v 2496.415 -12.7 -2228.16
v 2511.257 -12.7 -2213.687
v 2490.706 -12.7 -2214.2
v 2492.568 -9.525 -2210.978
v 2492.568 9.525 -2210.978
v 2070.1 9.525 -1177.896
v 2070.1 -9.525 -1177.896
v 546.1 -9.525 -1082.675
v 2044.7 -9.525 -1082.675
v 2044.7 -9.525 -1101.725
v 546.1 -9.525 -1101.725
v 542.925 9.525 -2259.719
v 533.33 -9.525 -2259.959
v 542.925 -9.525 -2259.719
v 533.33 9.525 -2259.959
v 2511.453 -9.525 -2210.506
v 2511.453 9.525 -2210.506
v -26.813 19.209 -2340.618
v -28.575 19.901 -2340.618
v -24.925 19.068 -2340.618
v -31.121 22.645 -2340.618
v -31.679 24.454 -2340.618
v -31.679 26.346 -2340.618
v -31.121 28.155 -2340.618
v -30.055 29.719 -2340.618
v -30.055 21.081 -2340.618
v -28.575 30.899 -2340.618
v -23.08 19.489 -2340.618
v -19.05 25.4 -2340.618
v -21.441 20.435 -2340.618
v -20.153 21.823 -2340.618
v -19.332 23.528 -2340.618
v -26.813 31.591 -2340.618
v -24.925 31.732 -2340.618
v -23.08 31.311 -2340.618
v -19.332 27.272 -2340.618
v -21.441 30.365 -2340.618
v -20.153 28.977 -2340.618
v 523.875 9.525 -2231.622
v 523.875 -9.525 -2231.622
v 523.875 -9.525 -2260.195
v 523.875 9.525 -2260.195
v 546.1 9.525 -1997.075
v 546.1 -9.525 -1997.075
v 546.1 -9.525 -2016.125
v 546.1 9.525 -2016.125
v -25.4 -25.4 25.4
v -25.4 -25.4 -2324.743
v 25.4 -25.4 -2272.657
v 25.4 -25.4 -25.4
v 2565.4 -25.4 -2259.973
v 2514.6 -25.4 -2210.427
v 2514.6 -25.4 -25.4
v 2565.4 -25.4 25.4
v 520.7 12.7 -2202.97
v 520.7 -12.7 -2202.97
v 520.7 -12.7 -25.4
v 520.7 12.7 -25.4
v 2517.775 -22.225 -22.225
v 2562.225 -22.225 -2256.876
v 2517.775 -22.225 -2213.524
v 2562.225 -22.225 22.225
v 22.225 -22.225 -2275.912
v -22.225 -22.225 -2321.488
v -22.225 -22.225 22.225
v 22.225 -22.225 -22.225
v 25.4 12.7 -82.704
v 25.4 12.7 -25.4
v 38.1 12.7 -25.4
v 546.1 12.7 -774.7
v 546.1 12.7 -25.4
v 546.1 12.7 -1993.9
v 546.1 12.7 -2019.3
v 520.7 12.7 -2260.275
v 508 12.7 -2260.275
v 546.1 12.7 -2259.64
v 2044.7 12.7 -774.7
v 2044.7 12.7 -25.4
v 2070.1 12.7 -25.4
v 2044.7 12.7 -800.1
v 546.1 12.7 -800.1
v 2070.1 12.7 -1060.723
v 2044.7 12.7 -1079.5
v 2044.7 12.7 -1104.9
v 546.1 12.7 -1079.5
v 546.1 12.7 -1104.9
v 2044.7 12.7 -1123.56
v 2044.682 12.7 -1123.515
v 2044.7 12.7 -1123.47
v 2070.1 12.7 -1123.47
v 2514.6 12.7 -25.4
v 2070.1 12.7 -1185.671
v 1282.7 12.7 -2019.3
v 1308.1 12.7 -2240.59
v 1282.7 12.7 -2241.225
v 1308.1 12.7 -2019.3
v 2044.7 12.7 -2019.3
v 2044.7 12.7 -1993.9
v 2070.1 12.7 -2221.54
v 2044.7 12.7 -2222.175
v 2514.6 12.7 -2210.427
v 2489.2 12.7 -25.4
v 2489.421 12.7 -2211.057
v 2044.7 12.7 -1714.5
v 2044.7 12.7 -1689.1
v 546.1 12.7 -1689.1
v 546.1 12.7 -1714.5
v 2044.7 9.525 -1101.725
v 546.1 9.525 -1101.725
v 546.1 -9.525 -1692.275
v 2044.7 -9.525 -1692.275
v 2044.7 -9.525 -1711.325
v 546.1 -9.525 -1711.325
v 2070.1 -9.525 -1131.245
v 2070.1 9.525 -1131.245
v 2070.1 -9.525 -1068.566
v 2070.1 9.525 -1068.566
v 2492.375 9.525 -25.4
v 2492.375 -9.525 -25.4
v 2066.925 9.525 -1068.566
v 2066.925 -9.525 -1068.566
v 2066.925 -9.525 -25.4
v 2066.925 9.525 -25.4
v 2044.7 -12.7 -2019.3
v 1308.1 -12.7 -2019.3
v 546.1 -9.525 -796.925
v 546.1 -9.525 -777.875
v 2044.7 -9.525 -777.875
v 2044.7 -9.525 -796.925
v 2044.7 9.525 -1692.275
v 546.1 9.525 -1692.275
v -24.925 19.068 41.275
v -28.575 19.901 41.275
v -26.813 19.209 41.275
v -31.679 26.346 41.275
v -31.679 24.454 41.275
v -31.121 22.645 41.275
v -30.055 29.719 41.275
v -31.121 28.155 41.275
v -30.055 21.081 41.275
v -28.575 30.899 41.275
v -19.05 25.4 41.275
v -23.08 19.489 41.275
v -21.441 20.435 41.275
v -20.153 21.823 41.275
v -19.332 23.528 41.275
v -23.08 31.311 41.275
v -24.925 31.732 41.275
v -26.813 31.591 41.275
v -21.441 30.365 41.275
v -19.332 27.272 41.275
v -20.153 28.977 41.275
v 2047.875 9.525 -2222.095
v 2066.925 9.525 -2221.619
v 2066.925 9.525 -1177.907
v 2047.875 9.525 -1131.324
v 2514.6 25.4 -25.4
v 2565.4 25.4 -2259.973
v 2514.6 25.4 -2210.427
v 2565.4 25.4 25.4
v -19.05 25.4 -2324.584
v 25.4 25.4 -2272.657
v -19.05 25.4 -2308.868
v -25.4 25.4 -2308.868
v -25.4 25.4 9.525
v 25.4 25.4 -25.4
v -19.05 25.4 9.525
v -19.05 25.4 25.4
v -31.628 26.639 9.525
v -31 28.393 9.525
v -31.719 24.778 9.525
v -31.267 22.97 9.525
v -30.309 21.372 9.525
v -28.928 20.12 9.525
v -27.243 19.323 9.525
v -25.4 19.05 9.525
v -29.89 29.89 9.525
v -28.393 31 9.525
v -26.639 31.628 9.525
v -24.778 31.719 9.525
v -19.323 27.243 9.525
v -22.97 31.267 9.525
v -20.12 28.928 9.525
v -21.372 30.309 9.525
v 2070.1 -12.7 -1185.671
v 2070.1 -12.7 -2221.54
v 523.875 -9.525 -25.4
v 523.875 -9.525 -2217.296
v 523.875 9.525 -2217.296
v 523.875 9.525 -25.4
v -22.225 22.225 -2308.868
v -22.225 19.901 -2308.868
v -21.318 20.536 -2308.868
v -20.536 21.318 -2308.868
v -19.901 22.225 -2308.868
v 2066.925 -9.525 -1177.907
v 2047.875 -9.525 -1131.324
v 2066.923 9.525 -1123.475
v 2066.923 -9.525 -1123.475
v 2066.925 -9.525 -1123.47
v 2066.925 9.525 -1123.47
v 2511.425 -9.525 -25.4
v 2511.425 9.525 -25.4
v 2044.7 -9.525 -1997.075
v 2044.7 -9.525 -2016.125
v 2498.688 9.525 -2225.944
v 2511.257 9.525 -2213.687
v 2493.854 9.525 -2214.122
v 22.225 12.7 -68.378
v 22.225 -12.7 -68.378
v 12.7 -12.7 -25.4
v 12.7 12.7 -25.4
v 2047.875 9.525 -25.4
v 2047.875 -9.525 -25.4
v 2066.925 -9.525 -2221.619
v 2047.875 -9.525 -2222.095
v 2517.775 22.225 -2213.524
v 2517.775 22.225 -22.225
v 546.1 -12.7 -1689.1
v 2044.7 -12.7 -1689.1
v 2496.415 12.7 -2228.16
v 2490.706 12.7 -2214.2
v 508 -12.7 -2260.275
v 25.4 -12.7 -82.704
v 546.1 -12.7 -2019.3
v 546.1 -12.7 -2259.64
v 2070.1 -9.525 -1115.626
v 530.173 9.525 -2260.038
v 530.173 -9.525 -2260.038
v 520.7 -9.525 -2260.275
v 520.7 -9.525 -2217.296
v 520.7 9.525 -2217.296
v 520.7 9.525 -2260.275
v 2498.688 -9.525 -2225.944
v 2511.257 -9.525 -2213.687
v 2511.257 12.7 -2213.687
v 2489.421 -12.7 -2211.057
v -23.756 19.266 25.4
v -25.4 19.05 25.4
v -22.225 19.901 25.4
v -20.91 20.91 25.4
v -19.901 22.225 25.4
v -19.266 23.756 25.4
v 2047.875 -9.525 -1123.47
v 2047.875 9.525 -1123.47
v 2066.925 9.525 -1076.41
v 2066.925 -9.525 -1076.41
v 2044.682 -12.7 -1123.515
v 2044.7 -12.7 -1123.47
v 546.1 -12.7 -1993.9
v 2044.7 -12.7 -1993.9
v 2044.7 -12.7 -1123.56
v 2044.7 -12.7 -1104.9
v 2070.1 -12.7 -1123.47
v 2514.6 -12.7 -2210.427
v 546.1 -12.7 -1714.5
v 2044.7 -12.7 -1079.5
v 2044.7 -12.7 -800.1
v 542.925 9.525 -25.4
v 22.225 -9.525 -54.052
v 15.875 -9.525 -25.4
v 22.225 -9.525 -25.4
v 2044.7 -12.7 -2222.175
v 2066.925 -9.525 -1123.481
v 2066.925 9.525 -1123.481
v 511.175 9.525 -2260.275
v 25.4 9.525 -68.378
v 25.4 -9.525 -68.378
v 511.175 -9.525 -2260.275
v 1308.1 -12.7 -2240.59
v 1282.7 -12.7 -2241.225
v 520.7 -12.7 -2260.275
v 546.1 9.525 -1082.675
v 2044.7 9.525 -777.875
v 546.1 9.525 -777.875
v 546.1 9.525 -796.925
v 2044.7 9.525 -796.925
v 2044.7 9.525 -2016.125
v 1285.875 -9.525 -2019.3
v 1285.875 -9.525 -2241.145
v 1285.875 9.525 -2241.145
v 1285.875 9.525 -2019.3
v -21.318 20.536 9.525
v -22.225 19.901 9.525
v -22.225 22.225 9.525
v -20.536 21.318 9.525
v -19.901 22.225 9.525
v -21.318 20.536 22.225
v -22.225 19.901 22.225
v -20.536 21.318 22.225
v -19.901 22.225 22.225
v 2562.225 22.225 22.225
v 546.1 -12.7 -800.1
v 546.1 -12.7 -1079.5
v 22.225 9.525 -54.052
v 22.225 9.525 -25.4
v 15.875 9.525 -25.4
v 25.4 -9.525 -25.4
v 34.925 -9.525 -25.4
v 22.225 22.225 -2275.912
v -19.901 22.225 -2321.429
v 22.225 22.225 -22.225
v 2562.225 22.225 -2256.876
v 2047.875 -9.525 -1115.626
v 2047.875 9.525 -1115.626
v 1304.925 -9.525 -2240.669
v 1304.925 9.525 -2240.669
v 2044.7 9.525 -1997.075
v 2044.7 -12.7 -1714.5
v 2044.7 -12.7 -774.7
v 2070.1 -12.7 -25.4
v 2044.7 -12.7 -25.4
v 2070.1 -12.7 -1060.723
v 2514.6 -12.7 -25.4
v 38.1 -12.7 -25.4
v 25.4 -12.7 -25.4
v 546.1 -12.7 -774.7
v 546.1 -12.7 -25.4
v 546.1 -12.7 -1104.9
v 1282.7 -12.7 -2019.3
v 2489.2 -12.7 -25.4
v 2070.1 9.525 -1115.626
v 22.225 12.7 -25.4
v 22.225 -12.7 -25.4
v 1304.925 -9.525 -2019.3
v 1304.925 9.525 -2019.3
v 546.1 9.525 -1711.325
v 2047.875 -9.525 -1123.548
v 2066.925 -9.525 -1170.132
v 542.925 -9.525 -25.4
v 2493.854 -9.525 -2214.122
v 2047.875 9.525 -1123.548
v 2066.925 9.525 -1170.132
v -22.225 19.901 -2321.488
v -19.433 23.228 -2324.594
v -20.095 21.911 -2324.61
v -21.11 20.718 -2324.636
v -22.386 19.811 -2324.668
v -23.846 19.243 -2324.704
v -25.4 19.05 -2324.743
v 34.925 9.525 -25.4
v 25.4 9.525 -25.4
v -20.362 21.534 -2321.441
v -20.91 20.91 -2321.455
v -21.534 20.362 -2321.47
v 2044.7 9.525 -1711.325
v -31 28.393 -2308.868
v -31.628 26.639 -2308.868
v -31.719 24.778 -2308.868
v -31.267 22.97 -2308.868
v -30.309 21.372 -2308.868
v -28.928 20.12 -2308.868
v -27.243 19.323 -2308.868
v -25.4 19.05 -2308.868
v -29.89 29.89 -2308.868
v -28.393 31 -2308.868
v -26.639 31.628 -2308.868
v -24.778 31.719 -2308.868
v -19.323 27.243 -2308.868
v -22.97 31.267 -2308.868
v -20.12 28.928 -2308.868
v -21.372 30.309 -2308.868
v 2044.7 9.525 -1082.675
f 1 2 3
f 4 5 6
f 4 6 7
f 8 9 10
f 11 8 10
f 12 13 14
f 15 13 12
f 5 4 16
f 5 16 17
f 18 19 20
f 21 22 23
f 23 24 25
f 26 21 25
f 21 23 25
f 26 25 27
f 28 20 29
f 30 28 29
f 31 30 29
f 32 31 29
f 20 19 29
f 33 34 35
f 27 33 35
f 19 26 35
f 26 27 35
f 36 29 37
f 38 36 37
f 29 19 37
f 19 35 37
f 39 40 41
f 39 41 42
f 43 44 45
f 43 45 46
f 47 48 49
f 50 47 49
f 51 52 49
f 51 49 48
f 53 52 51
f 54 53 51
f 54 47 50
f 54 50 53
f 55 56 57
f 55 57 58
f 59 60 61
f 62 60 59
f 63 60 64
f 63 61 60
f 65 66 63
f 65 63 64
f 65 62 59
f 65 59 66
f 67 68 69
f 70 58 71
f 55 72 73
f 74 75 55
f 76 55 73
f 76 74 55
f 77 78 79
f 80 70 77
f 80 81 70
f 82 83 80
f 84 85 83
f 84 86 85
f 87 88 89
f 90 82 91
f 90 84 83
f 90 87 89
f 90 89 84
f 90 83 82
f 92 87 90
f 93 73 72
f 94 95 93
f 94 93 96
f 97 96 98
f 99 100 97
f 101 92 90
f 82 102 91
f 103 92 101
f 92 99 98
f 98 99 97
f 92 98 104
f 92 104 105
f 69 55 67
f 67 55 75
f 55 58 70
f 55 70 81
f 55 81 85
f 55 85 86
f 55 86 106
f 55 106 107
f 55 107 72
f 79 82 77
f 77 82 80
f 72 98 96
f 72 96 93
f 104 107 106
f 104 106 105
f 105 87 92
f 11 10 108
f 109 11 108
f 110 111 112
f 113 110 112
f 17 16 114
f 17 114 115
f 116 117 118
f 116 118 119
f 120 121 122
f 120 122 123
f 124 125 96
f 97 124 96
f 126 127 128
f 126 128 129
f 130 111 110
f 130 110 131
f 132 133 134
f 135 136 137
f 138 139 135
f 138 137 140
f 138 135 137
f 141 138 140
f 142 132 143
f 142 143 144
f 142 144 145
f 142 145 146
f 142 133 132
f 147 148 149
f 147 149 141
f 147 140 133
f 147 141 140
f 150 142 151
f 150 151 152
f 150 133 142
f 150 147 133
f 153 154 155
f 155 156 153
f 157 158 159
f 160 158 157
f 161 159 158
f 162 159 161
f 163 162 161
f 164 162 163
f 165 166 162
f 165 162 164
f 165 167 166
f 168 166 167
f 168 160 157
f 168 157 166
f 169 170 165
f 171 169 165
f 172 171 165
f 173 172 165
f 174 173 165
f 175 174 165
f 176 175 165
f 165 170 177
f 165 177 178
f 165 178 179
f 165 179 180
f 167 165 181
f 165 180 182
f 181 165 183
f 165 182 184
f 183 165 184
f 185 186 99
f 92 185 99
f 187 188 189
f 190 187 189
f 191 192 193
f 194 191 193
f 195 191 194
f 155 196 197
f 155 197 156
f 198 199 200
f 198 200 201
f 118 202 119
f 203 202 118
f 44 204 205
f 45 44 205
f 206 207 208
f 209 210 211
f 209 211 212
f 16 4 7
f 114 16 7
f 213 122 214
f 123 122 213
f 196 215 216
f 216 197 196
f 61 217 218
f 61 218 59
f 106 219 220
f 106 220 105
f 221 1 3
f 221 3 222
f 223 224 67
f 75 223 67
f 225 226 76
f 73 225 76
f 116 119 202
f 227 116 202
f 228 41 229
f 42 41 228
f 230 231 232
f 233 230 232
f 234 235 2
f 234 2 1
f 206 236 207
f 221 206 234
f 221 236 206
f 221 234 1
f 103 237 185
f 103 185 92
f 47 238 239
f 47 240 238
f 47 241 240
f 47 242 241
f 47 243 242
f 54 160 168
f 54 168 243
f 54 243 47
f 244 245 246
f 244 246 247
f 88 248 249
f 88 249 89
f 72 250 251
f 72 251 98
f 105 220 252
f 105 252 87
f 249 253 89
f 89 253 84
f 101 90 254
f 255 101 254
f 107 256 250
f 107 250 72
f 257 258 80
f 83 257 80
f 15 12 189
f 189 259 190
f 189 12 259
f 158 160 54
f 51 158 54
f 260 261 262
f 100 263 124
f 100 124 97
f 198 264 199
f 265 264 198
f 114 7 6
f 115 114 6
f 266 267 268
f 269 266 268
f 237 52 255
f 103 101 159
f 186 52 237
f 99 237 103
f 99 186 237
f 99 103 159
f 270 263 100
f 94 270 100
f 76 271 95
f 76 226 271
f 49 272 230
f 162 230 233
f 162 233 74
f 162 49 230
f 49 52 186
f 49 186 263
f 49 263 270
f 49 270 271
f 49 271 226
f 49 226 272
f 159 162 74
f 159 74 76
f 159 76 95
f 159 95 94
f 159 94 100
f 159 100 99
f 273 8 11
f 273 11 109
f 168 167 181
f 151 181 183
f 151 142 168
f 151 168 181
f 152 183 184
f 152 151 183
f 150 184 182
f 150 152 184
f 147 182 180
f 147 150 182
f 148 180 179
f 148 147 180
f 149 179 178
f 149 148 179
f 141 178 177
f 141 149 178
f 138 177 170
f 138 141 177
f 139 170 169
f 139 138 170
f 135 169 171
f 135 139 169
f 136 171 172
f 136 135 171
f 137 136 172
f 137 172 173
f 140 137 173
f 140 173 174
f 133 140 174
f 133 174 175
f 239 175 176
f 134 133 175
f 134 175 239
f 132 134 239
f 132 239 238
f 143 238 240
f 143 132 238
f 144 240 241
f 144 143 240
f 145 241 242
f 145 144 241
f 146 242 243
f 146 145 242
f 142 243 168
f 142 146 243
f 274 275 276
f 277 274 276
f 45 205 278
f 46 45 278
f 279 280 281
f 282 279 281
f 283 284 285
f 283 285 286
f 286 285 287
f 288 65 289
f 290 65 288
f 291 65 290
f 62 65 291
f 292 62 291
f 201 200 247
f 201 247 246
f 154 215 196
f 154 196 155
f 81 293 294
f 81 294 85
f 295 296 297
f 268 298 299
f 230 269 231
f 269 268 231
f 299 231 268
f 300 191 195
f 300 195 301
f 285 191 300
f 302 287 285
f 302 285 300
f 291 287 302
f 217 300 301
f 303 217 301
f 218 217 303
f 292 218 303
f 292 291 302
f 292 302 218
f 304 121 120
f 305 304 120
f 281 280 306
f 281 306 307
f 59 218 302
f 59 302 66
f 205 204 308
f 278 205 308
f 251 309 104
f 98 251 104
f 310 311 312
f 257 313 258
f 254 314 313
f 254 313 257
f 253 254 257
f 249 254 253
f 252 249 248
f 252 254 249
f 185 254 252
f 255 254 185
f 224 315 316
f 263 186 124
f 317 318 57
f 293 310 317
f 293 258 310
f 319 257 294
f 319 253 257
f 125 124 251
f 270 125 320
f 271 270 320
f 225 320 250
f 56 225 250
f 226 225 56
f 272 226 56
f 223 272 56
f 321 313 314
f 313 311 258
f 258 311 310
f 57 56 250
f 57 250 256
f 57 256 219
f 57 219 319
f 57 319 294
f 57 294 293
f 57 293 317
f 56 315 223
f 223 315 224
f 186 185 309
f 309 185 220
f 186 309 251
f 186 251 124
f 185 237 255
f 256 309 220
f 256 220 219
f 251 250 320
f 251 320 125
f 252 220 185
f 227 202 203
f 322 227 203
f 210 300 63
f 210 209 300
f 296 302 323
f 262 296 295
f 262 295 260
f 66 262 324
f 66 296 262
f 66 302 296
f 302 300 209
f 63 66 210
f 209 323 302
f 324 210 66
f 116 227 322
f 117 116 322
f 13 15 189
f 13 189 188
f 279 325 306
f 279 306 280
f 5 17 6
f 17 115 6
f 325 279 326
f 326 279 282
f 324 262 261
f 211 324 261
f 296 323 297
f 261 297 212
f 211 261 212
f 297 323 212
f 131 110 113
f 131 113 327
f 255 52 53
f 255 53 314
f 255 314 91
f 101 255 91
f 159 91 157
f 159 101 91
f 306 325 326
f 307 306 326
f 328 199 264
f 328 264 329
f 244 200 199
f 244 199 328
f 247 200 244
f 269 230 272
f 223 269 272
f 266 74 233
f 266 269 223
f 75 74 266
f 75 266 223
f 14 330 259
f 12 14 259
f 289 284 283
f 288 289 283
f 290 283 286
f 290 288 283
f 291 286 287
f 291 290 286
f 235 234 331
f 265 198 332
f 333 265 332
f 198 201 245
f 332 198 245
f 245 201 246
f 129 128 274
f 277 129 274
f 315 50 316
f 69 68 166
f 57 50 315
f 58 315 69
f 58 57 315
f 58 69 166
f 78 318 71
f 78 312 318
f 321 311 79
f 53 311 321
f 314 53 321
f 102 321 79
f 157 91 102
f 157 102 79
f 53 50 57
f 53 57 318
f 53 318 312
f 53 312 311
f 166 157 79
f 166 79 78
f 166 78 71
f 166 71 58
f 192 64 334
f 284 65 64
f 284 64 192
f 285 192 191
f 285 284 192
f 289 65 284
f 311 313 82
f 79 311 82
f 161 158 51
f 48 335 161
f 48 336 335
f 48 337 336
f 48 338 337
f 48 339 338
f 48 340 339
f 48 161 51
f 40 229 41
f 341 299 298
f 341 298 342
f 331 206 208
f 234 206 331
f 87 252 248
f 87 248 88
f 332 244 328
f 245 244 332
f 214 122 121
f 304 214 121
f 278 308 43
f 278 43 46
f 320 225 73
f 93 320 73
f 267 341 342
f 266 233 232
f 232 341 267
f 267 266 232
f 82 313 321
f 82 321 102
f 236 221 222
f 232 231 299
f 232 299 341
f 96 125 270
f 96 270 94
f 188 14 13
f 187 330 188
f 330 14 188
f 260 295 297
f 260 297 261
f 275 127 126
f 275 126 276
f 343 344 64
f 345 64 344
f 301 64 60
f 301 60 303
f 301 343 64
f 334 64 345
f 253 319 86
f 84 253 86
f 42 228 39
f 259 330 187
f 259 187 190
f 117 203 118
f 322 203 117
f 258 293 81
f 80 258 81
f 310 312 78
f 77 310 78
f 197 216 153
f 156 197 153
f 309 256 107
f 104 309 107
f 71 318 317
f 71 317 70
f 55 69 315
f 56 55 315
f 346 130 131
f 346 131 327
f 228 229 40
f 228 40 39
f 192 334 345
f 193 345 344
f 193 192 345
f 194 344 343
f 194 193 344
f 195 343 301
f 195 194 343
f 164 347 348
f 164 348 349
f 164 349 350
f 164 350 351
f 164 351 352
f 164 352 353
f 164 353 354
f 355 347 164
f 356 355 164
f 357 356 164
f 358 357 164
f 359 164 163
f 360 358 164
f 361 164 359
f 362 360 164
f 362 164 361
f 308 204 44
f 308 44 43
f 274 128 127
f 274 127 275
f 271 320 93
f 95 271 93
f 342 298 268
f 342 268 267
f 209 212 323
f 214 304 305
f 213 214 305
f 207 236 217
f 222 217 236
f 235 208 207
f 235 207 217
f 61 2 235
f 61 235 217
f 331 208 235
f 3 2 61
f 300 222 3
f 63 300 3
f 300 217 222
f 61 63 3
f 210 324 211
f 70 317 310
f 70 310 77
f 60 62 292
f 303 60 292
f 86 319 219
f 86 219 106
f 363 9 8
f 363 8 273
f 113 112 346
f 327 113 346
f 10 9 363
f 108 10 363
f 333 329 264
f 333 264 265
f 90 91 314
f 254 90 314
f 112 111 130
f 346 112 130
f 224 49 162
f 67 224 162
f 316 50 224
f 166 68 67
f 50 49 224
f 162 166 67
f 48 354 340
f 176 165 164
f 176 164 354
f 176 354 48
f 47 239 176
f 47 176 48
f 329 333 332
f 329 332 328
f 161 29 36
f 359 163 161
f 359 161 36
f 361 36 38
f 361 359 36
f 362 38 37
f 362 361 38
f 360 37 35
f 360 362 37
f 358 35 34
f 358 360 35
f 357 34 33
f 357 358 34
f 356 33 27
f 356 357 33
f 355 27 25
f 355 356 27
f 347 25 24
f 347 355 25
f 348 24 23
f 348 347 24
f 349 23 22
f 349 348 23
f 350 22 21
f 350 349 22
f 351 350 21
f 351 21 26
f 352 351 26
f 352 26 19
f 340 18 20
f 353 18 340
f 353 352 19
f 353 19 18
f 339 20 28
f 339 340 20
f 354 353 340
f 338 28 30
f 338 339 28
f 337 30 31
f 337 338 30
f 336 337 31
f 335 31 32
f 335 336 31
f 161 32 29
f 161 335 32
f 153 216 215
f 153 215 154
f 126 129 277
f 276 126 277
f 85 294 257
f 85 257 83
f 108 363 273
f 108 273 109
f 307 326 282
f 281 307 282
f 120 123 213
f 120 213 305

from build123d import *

# Parameters (mm, degrees)
SKETCH2_W           = 50.8
SKETCH2_H           = 50.8
SKETCH2_W_2         = 44.45
SKETCH2_H_2         = 44.45
BOSS_EXTRUDE1_REACH = 2301.343
SKETCH3_W           = 25.4
SKETCH3_H           = 25.4
SKETCH3_W_2         = 19.05
SKETCH3_H_2         = 19.05
SKETCH4_W           = 25.4
SKETCH4_H           = 25.4
SKETCH4_W_2         = 19.05
SKETCH4_H_2         = 19.05
BOSS_EXTRUDE2_DEPTH = 1498.6
SKETCH5_W           = 25.4
SKETCH5_H           = 25.4
SKETCH5_W_2         = 19.05
SKETCH5_H_2         = 19.05
BOSS_EXTRUDE3_REACH = 307.443
SKETCH11_W          = 25.4
SKETCH11_H          = 25.4
SKETCH11_W_2        = 19.05
SKETCH11_H_2        = 19.05
SKETCH13_W          = 25.4
SKETCH13_H          = 25.4
SKETCH13_W_2        = 19.05
SKETCH13_H_2        = 19.05
SKETCH15_R          = 6.35
BOSS_EXTRUDE4_DEPTH = 15.875
SKETCH16_R          = 6.35
BOSS_EXTRUDE5_DEPTH = 15.875


with BuildPart() as part:
    # Sweep1: sweep along a path in Sketch1
    with BuildLine(Plane(origin=(0, 0, 0), x_dir=(1, 0, 0), z_dir=(0, 1, 0))) as sweep1_path:
        Line((0, 2298.7), (0, 0))
        Line((0, 0), (2540, 0))
        Line((2540, 0), (2540, 2235.2))
        Line((2540, 2235.2), (0, 2298.7))
    # Sketch2 → Sweep1 (sweep)
    with BuildSketch(Plane.XY.offset(-1016)):
        Rectangle(SKETCH2_W, SKETCH2_H)
        Rectangle(SKETCH2_W_2, SKETCH2_H_2, mode=Mode.SUBTRACT)
    sweep(path=sweep1_path.line, transition=Transition.RIGHT)

    # Boss-Extrude1: up to this face of the body (flat: up to its plane)
    boss_extrude1_end = Plane(part.part.faces().sort_by_distance((1270, 0, -2241.54206374))[0])
    # Sketch3 → Boss-Extrude1 (add, up to the picked face)
    with BuildSketch(Plane(origin=(0, 0, -25.4), x_dir=(-1, 0, 0), z_dir=(0, 0, -1)), mode=Mode.PRIVATE) as boss_extrude1_sk1:
        with Locations((-533.4, 0)):
            Rectangle(SKETCH3_W, SKETCH3_H)
        with Locations((-533.4, 0)):
            Rectangle(SKETCH3_W_2, SKETCH3_H_2, mode=Mode.SUBTRACT)
    boss_extrude1_tool1 = split(extrude(boss_extrude1_sk1.sketch, amount=BOSS_EXTRUDE1_REACH, mode=Mode.PRIVATE), bisect_by=boss_extrude1_end, keep=Keep.BOTH, mode=Mode.PRIVATE)
    add(boss_extrude1_tool1.solids().sort_by_distance((521.05921, 0, -25.4))[0])
    # Sketch3 → Boss-Extrude1 (add, up to the picked face)
    with BuildSketch(Plane(origin=(0, 0, -25.4), x_dir=(-1, 0, 0), z_dir=(0, 0, -1)), mode=Mode.PRIVATE) as boss_extrude1_sk2:
        with Locations((-2057.4, 0)):
            Rectangle(SKETCH3_W, SKETCH3_H)
        with Locations((-2057.4, 0)):
            Rectangle(SKETCH3_W_2, SKETCH3_H_2, mode=Mode.SUBTRACT)
    boss_extrude1_tool2 = split(extrude(boss_extrude1_sk2.sketch, amount=BOSS_EXTRUDE1_REACH, mode=Mode.PRIVATE), bisect_by=boss_extrude1_end, keep=Keep.BOTH, mode=Mode.PRIVATE)
    add(boss_extrude1_tool2.solids().sort_by_distance((2057.4, -12.34079, -25.4))[0])

    # Sketch4 → Boss-Extrude2 (add)
    with BuildSketch(Plane(origin=(546.1, 0, 0), x_dir=(0, 0, -1), z_dir=(1, 0, 0))):
        with Locations((787.4, 0)):
            Rectangle(SKETCH4_W, SKETCH4_H)
        with Locations((787.4, 0)):
            Rectangle(SKETCH4_W_2, SKETCH4_H_2, mode=Mode.SUBTRACT)
        with Locations((1092.2, 0)):
            Rectangle(SKETCH4_W, SKETCH4_H)
        with Locations((1092.2, 0)):
            Rectangle(SKETCH4_W_2, SKETCH4_H_2, mode=Mode.SUBTRACT)
        with Locations((1701.8, 0)):
            Rectangle(SKETCH4_W, SKETCH4_H)
        with Locations((1701.8, 0)):
            Rectangle(SKETCH4_W_2, SKETCH4_H_2, mode=Mode.SUBTRACT)
        with Locations((2006.6, 0)):
            Rectangle(SKETCH4_W, SKETCH4_H)
        with Locations((2006.6, 0)):
            Rectangle(SKETCH4_W_2, SKETCH4_H_2, mode=Mode.SUBTRACT)
    extrude(amount=BOSS_EXTRUDE2_DEPTH)

    # Sweep2: sweep along a path in Sketch6
    with BuildLine(Plane(origin=(0, 25.4, 0), x_dir=(1, 0, 0), z_dir=(0, 1, 0))) as sweep2_path:
        Line((25.4, 25.4), (520.7, 2260.27456374))
    # Sketch5 → Sweep2 (sweep)
    with BuildSketch(Plane(origin=(0, 0, -25.4), x_dir=(-1, 0, 0), z_dir=(0, 0, -1))):
        with Locations((-25.4, 0)):
            Rectangle(SKETCH5_W, SKETCH5_H)
        with Locations((-25.4, 0)):
            Rectangle(SKETCH5_W_2, SKETCH5_H_2, mode=Mode.SUBTRACT)
    sweep(path=sweep2_path.line)

    # Boss-Extrude3: up to this face of the body (flat: up to its plane)
    boss_extrude3_end = Plane(part.part.faces().sort_by_distance((1269.73814433, 0, -2241.548610131))[0])
    # Sketch11 → Boss-Extrude3 (add, up to the picked face)
    with BuildSketch(Plane(origin=(0, 0, -2019.3), x_dir=(-1, 0, 0), z_dir=(0, 0, -1)), mode=Mode.PRIVATE) as boss_extrude3_sk1:
        with Locations((-1295.4, 0)):
            Rectangle(SKETCH11_W, SKETCH11_H)
        with Locations((-1295.4, 0)):
            Rectangle(SKETCH11_W_2, SKETCH11_H_2, mode=Mode.SUBTRACT)
    boss_extrude3_tool1 = split(extrude(boss_extrude3_sk1.sketch, amount=BOSS_EXTRUDE3_REACH, mode=Mode.PRIVATE), bisect_by=boss_extrude3_end, keep=Keep.BOTH, mode=Mode.PRIVATE)
    add(boss_extrude3_tool1.solids().sort_by_distance((1295.4, -12.34079, -2019.3))[0])

    # Sweep6: sweep along a path in Sketch14
    with BuildLine(Plane(origin=(0, 25.4, 0), x_dir=(1, 0, 0), z_dir=(0, 1, 0))) as sweep6_path:
        Line((2514.6, 25.4), (2070.1, 1123.46978187))
        Line((2070.1, 1123.46978187), (2514.6, 2210.42706374))
    # Sketch13 → Sweep6 (sweep)
    with BuildSketch(Plane(origin=(0, 0, -25.4), x_dir=(-1, 0, 0), z_dir=(0, 0, -1))):
        with Locations((-2501.9, 0)):
            Rectangle(SKETCH13_W, SKETCH13_H)
        with Locations((-2501.9, 0)):
            Rectangle(SKETCH13_W_2, SKETCH13_H_2, mode=Mode.SUBTRACT)
    sweep(path=sweep6_path.line, transition=Transition.RIGHT)

    # Sketch15 → Boss-Extrude4 (add, symmetric)
    with BuildSketch(Plane.XY.offset(-2324.74293626)):
        with Locations((-25.4, 25.4)):
            Circle(SKETCH15_R)
    extrude(amount=BOSS_EXTRUDE4_DEPTH, both=True)

    # Sketch16 → Boss-Extrude5 (add, symmetric)
    with BuildSketch(Plane.XY.offset(25.4)):
        with Locations((-25.4, 25.4)):
            Circle(SKETCH16_R)
    extrude(amount=BOSS_EXTRUDE5_DEPTH, both=True)


solid = part.part
